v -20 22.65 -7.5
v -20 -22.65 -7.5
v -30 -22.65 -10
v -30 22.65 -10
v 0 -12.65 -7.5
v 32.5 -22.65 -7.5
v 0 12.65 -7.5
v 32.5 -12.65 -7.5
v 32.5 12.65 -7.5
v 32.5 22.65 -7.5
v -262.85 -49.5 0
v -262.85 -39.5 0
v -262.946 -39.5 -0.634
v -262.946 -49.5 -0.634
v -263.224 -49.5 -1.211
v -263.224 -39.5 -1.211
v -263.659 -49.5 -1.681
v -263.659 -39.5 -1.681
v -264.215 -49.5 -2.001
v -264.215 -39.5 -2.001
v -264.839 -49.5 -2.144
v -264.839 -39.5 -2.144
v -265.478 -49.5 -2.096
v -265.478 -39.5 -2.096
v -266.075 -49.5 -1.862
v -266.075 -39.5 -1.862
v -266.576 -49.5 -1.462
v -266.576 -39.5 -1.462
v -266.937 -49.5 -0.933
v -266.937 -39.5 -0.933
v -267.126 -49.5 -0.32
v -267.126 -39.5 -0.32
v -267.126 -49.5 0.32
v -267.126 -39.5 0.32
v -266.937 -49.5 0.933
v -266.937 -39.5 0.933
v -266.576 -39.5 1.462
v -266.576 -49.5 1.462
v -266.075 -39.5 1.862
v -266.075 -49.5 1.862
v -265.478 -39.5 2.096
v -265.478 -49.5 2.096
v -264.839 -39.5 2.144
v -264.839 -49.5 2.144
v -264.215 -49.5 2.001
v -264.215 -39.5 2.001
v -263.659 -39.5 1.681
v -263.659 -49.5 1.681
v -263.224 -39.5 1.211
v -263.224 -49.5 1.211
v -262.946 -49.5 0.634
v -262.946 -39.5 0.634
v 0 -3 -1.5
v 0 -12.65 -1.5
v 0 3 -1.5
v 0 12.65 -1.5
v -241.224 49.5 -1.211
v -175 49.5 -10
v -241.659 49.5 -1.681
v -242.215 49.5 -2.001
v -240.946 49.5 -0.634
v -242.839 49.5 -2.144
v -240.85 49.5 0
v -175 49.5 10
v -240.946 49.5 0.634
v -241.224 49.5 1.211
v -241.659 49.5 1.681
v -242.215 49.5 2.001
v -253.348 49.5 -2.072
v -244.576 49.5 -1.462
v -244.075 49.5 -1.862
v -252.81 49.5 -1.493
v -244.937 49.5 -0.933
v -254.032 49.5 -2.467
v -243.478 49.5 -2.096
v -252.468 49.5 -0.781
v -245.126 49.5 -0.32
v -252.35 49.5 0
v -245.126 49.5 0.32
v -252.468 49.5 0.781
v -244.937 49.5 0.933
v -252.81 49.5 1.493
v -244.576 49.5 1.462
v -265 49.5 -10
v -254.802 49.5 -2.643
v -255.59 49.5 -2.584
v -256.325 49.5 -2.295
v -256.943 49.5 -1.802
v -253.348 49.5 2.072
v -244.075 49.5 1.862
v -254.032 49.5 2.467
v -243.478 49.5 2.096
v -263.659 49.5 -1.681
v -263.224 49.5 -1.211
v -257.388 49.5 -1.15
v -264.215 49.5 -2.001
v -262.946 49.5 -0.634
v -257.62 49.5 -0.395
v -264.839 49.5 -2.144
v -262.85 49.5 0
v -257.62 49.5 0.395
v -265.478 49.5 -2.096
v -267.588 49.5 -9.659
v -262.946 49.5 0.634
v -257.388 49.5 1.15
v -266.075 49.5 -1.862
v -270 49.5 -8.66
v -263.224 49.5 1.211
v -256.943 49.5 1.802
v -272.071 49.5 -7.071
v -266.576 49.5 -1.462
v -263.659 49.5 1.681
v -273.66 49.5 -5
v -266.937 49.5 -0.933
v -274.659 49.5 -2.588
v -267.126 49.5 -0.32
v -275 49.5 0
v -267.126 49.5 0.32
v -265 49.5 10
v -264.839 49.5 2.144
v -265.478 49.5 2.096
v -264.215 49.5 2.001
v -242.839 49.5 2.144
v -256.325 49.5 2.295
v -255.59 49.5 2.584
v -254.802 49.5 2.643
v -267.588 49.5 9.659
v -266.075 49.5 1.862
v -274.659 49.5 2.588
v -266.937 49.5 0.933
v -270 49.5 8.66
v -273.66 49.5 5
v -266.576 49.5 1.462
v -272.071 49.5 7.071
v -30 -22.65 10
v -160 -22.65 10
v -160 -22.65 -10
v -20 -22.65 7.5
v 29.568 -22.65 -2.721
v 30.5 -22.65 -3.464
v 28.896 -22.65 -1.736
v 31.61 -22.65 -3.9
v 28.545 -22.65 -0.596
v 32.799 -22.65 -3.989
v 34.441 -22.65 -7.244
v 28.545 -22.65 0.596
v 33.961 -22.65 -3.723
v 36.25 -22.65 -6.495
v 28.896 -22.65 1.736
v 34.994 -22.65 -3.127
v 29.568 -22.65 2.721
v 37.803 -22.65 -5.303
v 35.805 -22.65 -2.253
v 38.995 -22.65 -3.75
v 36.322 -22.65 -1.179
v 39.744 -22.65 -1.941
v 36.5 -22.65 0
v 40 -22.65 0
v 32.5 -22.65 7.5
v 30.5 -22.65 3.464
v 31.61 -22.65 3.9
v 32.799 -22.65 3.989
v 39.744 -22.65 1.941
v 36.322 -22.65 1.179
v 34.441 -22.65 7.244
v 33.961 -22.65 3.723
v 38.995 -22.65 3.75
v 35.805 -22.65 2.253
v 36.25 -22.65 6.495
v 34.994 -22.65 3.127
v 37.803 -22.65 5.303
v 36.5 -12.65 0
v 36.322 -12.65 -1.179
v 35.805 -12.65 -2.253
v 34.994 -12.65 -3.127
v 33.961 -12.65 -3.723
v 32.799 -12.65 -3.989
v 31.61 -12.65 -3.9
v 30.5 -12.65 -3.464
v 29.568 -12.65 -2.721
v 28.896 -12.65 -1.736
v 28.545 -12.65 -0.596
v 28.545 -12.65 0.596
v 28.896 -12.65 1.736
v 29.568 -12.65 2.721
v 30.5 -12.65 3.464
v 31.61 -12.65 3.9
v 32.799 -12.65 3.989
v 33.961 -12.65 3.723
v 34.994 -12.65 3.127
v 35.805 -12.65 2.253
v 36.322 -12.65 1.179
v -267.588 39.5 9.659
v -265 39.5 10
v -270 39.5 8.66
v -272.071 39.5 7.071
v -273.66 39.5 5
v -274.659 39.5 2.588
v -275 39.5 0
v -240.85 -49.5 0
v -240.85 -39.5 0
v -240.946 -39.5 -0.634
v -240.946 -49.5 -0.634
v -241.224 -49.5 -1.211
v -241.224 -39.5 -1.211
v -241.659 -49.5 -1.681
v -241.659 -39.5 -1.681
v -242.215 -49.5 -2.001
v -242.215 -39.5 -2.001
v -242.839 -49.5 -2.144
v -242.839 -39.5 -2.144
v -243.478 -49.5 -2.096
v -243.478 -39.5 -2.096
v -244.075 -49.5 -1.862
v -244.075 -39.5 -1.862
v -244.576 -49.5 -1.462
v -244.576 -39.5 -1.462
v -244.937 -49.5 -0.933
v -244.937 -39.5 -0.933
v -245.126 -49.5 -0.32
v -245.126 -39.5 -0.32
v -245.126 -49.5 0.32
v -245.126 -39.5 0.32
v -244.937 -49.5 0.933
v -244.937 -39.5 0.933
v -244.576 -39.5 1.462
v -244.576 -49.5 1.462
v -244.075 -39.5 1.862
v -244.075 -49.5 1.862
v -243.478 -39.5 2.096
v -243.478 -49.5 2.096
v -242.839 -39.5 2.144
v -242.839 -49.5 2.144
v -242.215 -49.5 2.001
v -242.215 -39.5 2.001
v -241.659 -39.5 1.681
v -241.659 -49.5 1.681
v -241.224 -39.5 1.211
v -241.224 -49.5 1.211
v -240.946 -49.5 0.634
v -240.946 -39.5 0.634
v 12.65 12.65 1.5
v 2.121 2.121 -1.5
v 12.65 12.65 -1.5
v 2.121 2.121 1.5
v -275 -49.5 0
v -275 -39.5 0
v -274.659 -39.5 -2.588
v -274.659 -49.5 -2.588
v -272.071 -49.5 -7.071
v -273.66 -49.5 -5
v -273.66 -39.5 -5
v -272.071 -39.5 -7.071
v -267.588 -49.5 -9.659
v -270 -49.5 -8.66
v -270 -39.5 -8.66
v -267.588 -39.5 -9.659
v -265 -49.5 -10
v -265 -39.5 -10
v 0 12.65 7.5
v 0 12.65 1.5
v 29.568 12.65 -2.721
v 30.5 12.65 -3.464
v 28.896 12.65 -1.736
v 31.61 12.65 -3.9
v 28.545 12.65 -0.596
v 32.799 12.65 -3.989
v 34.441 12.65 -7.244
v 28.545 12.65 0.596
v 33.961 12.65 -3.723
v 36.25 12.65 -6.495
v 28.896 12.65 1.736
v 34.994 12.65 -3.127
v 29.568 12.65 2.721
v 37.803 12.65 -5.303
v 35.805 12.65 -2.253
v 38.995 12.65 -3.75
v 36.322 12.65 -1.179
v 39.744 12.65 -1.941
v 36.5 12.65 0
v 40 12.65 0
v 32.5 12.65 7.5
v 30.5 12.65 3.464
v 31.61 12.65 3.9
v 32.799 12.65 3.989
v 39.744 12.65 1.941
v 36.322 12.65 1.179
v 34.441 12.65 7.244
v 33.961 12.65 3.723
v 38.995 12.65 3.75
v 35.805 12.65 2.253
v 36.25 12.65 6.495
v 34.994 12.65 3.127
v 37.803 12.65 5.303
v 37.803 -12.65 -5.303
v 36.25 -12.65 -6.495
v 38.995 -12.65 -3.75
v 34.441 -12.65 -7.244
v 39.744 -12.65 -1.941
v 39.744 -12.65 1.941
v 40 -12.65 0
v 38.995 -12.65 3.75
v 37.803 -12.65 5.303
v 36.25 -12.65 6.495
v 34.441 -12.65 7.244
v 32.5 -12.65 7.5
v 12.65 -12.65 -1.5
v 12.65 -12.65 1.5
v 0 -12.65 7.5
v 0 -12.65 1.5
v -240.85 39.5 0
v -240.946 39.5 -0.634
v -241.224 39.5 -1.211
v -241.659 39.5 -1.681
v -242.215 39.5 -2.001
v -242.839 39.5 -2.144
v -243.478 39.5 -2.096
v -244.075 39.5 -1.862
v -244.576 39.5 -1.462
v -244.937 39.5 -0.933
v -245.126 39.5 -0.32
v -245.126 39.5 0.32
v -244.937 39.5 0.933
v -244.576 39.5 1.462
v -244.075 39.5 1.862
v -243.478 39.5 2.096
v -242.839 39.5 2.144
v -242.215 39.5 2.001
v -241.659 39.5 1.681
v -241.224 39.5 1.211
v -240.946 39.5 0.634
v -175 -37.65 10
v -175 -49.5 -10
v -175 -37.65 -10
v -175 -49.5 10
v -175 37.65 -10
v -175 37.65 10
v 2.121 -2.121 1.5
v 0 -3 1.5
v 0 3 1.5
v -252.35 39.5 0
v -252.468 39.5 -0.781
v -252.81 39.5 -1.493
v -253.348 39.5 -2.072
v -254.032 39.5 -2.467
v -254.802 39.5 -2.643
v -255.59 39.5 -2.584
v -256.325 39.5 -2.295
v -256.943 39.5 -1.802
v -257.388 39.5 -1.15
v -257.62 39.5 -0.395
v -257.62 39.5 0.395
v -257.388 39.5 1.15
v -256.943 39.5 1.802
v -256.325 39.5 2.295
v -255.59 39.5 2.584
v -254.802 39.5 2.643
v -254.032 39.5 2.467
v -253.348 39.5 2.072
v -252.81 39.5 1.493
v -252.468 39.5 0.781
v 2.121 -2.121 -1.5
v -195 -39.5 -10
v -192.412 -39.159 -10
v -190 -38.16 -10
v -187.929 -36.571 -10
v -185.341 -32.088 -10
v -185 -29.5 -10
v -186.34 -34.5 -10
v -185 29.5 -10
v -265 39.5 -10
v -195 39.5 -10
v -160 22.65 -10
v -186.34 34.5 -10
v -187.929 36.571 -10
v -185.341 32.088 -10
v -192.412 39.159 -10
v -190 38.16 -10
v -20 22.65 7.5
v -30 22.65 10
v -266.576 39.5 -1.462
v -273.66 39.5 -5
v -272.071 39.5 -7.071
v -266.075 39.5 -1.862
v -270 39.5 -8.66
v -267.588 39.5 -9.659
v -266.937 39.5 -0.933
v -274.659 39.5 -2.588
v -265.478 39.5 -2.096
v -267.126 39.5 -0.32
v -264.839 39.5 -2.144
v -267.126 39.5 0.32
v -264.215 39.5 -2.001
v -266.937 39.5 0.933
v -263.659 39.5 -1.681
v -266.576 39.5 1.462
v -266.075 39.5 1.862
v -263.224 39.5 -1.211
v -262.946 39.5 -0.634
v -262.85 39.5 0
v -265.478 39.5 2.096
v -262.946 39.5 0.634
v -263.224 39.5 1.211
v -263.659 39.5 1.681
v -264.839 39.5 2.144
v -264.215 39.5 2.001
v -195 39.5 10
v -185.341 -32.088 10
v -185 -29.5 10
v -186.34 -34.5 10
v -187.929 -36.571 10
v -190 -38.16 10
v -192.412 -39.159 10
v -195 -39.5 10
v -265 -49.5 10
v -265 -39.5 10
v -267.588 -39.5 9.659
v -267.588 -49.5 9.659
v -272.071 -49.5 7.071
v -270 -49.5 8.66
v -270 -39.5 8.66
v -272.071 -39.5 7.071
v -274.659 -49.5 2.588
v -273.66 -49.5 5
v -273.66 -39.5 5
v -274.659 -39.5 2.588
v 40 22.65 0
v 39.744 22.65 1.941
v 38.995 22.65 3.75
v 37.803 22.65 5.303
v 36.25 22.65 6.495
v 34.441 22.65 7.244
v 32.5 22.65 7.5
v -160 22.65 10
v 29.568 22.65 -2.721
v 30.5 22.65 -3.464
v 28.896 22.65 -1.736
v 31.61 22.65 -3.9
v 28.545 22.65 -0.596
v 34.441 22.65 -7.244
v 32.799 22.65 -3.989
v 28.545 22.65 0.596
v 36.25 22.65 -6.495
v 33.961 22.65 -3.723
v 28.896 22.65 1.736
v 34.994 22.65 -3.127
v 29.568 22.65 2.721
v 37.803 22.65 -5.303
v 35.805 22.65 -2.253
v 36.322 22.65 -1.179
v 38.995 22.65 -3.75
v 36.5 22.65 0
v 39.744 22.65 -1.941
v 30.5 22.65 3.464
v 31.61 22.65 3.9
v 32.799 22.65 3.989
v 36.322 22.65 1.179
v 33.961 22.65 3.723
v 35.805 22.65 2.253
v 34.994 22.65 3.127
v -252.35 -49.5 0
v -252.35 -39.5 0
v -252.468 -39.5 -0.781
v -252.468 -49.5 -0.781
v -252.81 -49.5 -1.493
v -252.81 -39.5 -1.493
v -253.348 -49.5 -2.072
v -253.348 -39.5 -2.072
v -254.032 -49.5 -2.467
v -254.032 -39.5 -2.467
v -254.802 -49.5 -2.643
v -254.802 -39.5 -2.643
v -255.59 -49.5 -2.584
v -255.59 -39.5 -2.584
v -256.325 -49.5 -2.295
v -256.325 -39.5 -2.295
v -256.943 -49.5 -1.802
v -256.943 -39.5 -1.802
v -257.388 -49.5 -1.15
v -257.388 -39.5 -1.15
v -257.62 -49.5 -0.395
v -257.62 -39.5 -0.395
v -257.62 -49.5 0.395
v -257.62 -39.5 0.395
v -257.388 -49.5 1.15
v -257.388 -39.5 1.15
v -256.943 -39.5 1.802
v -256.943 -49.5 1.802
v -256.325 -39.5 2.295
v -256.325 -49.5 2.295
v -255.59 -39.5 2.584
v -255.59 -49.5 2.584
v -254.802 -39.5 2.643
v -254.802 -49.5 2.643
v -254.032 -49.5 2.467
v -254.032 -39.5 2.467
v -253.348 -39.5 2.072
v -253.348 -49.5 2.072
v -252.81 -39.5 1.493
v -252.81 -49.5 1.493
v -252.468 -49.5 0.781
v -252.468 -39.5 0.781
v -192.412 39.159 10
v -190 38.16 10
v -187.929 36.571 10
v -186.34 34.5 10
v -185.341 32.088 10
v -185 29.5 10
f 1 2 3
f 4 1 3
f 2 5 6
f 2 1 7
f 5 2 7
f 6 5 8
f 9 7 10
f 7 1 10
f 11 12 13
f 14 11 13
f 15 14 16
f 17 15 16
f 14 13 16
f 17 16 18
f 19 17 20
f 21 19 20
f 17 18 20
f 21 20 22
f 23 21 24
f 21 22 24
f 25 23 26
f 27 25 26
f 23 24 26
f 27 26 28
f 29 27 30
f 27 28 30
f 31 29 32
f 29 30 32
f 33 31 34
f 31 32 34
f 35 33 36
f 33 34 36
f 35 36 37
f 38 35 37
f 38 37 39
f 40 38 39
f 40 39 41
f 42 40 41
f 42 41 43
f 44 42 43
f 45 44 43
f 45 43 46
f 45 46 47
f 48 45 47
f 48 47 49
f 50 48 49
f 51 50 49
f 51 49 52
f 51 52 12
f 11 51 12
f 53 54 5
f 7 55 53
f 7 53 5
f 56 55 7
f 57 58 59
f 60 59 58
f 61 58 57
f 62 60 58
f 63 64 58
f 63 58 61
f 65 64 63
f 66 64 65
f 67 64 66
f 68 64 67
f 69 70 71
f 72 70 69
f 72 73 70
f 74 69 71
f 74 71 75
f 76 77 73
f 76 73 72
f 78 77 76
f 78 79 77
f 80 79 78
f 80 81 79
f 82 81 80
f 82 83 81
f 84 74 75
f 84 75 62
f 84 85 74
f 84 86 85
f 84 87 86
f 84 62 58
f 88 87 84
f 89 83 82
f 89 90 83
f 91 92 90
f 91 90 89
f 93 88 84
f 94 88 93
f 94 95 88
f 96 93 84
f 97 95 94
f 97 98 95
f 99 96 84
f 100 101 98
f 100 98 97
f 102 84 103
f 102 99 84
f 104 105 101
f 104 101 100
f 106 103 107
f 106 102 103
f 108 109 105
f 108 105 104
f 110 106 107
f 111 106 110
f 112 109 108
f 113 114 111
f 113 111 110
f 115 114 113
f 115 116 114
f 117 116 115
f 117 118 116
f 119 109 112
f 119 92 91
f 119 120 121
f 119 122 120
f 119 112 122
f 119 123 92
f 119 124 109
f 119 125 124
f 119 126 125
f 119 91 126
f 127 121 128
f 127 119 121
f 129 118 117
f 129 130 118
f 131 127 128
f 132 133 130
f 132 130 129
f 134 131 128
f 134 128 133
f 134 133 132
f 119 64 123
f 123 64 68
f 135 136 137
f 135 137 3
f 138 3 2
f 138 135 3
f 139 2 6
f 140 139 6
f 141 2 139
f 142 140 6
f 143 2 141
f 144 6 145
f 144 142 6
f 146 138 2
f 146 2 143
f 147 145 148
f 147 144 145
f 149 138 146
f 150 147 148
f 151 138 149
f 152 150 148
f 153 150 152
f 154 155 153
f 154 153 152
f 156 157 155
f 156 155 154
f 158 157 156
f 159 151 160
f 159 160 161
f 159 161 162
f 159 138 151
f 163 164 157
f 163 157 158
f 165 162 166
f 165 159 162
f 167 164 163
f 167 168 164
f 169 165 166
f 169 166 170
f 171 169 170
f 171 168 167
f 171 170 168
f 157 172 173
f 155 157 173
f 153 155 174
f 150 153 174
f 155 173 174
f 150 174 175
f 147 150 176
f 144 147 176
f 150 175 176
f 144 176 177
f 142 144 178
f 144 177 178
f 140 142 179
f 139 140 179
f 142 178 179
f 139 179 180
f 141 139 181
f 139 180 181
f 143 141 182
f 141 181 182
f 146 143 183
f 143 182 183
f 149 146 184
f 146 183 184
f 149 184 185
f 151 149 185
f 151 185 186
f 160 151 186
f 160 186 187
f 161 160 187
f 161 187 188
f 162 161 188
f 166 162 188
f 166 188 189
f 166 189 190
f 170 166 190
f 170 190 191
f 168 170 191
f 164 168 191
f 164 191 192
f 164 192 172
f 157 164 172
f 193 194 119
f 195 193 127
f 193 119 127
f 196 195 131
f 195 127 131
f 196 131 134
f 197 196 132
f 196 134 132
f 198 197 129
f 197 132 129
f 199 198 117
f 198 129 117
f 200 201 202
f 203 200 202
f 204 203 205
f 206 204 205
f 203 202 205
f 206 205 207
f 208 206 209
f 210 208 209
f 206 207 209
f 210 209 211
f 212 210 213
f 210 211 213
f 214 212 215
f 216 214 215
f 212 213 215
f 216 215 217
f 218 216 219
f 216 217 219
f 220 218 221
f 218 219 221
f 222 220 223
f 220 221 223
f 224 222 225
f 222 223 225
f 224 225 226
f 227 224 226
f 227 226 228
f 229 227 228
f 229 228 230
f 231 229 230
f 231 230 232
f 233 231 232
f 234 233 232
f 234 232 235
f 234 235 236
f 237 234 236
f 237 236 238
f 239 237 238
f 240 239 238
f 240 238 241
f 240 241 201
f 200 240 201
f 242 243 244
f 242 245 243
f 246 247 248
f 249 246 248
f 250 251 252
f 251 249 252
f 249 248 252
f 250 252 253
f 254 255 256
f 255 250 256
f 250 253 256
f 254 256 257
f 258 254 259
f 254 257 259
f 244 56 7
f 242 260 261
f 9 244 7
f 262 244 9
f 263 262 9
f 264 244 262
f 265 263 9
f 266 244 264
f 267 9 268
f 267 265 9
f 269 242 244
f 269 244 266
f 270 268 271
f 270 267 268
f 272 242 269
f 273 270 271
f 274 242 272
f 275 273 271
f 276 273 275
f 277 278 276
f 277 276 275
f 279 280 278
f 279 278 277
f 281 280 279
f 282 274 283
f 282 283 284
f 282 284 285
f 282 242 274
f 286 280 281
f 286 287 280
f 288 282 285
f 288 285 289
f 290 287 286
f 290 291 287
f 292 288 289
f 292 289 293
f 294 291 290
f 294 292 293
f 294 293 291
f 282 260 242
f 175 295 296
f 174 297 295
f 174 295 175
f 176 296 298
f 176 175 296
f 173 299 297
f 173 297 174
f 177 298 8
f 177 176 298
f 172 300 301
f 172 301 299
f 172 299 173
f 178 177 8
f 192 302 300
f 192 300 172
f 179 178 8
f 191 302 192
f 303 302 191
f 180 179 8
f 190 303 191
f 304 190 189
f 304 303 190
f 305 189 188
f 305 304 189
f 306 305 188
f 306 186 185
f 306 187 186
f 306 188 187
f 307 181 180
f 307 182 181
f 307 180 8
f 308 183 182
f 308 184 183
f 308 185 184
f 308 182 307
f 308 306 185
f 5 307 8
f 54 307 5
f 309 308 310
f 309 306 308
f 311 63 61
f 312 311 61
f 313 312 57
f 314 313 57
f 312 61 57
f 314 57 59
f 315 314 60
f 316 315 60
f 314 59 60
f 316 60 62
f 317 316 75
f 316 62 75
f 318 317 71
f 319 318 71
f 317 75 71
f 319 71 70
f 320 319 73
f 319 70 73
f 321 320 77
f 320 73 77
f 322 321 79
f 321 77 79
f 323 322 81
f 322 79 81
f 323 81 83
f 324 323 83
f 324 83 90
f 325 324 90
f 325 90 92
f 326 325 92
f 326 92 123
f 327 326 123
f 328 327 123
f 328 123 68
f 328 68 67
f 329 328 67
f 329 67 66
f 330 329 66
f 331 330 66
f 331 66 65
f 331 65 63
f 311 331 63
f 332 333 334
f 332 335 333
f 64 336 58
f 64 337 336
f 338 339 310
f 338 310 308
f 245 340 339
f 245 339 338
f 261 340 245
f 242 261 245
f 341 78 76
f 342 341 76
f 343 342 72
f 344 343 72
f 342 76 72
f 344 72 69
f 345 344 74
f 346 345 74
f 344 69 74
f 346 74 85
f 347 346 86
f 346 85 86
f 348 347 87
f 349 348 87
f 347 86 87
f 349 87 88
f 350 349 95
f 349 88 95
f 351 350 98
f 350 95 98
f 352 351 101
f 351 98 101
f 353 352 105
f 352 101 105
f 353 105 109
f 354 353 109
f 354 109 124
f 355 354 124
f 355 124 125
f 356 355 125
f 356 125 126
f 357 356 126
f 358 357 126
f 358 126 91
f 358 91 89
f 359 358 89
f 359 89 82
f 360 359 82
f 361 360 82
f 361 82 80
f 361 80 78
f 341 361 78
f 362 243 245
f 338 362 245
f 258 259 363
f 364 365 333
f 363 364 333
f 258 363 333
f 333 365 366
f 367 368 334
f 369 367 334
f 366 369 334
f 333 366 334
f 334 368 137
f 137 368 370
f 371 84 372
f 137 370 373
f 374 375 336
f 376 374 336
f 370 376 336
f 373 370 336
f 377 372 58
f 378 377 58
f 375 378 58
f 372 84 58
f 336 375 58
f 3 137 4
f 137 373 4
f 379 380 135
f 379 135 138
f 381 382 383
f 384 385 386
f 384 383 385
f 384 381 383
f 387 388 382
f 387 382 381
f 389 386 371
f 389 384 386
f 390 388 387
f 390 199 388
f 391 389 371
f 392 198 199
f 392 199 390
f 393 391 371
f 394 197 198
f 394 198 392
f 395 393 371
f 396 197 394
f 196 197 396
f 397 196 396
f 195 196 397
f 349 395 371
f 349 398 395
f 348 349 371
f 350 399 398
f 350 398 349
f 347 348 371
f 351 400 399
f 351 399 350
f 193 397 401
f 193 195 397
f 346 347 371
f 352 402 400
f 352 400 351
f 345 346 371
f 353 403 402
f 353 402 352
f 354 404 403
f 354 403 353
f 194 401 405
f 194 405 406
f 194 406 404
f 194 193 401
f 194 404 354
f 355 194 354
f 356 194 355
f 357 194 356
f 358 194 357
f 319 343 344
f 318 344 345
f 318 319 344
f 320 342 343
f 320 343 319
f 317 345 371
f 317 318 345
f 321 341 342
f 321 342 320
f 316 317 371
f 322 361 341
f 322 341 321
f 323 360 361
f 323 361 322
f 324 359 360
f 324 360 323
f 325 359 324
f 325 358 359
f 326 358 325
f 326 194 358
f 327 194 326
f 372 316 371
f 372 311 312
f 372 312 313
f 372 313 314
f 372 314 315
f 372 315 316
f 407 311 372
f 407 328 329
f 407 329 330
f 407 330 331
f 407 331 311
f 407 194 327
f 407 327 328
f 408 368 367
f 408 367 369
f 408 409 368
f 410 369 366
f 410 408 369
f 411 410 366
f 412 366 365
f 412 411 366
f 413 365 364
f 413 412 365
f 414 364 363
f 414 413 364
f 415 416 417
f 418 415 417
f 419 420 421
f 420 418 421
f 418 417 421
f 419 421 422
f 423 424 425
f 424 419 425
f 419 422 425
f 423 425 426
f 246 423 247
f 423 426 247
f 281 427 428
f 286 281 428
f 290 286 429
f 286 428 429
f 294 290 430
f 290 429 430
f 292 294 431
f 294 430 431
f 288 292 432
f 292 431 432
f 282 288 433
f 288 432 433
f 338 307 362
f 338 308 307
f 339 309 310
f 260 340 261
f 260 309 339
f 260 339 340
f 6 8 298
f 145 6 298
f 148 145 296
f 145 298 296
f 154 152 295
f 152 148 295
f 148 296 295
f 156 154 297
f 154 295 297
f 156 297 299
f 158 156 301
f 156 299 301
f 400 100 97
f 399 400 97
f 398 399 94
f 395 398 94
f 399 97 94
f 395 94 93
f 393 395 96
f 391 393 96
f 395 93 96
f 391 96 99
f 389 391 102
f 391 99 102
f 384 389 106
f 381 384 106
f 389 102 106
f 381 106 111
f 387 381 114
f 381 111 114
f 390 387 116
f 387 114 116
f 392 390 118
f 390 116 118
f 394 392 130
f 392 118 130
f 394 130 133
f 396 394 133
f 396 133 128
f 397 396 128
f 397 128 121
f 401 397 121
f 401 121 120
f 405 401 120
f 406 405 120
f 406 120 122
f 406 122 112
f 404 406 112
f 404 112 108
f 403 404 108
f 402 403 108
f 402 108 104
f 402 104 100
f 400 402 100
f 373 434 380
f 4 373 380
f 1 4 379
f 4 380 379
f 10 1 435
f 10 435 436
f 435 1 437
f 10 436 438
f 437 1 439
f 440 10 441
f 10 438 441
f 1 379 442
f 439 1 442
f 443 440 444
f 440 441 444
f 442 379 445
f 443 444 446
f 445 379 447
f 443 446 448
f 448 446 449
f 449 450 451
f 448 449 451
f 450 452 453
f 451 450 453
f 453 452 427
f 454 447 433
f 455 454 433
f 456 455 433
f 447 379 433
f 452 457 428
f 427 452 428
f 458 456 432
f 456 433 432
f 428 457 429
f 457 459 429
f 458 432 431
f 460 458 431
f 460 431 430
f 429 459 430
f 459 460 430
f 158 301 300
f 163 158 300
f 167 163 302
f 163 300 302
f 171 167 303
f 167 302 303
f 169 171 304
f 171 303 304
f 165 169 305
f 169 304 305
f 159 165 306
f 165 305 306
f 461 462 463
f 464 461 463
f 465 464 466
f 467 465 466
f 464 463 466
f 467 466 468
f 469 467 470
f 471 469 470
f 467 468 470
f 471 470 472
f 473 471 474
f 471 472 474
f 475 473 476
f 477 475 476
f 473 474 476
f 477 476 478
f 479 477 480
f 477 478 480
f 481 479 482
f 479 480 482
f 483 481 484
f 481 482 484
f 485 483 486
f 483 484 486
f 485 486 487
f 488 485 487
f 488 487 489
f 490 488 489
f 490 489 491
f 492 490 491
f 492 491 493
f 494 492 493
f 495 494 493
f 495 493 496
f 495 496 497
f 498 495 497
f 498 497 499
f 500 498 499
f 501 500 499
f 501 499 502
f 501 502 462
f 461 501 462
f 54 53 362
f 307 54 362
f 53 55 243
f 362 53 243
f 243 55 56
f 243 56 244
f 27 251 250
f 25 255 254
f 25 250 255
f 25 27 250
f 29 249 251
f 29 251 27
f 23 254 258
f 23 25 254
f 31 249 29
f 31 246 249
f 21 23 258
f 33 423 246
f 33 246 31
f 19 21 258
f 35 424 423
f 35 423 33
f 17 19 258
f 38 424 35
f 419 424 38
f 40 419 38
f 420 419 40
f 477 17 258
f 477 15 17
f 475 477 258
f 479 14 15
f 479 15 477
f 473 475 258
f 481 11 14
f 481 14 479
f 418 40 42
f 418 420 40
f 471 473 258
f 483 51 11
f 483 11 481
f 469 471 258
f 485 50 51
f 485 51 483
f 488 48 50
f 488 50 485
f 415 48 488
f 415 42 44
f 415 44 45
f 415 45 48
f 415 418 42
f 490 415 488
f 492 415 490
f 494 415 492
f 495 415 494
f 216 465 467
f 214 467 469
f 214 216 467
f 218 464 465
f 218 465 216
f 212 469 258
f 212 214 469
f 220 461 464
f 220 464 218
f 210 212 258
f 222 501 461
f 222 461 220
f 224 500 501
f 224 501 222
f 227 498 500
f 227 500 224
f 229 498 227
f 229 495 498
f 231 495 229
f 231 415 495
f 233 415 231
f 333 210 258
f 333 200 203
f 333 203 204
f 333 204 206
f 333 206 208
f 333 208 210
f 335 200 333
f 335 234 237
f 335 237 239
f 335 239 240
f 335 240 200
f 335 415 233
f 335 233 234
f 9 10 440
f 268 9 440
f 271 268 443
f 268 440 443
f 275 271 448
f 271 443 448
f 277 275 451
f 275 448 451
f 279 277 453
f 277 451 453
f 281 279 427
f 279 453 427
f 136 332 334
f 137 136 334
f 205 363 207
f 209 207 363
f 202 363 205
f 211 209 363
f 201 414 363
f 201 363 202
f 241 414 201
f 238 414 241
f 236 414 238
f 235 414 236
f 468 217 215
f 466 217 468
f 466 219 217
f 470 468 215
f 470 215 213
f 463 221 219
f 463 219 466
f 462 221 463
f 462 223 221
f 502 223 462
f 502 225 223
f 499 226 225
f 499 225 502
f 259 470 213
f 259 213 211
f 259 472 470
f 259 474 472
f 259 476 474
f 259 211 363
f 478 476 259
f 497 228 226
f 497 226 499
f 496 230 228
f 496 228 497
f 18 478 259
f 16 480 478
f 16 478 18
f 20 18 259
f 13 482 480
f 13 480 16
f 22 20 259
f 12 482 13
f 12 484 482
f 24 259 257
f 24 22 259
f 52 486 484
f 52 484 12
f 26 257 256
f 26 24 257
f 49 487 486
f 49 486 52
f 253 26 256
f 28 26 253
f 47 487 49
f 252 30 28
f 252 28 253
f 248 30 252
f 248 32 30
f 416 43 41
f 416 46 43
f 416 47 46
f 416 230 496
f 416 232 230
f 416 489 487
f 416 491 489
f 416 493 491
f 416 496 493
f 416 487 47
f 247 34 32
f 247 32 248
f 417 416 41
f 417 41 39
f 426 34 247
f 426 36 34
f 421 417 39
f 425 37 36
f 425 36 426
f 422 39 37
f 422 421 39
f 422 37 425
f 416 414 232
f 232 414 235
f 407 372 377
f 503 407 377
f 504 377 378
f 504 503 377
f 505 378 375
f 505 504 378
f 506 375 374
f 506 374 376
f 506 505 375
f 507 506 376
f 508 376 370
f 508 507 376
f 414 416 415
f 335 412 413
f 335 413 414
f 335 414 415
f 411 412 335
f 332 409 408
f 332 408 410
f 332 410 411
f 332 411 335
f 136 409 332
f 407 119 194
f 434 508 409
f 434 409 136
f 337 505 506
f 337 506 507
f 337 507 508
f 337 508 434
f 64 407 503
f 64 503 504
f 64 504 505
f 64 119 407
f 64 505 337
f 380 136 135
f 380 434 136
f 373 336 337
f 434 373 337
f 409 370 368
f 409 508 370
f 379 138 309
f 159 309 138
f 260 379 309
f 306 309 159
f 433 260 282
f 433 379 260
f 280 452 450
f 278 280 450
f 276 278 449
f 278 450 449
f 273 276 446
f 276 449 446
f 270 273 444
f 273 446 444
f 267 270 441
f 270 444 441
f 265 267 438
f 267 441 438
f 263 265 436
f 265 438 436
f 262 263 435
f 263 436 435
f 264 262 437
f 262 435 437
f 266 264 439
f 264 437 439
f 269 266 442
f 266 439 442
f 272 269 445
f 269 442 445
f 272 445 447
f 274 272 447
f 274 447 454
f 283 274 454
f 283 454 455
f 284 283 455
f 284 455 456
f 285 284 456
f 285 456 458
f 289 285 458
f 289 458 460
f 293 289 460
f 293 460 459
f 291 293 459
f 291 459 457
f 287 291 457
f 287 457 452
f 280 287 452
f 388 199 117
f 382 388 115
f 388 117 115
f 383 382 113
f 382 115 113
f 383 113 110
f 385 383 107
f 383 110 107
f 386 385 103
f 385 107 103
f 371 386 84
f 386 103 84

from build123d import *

# Parameters (mm, degrees)
SKETCH_2_W          = 165
SKETCH_2_H          = 45.3
EXTRUDE_1_DEPTH     = 10
EXTRUDE_2_DEPTH     = 7.5
CHAMFER_1_SIZE      = 20
CHAMFER_1_SIZE_2    = 5
CHAMFER_2_SIZE      = 5
CHAMFER_2_SIZE_2    = 20
EXTRUDE_3_DEPTH     = 1.5
CHAMFER_3_SIZE      = 3
CUT_EXTRUDE_1_DEPTH = 293.448286027
CUT_EXTRUDE_2_DEPTH = 285.483079462
CHAMFER_4_SIZE      = 15
FILLET_1_R          = 10


with BuildPart() as part:
    # 草图2 → 凸台-拉伸1 (new, symmetric)
    with BuildSketch(Plane.XY):
        with Locations((-92.5, 0)):
            Rectangle(SKETCH_2_W, SKETCH_2_H)
        Polygon((-275, 49.5), (-275, 39.5), (-185, 39.5), (-185, -39.5), (-275, -39.5), (-275, -49.5), (-175, -49.5), (-175, 49.5), align=None)
    extrude(amount=EXTRUDE_1_DEPTH, both=True)

    # 草图2<3> → 凸台-拉伸2 (add, symmetric)
    with BuildSketch(Plane.XY):
        Polygon((40, -22.65), (40, -12.65), (0, -12.65), (0, 12.65), (40, 12.65), (40, 22.65), (-10, 22.65), (-10, -22.65), align=None)
    extrude(amount=EXTRUDE_2_DEPTH, both=True)

    # 倒角1
    # the kernel refuses this chamfer: 20, 5 mm, written as the material it takes off along each edge
    with BuildSketch(Plane(origin=(-10, -74.592549995, 10), x_dir=(-0.9999563942249224, 0, 0.00933861064031752), z_dir=(0, 1, 0))) as chamfer_1_piece_1_section:
        Polygon((CHAMFER_1_SIZE * 0.999956394225, -CHAMFER_1_SIZE * 0.00933861064032), (-CHAMFER_1_SIZE_2 * 0.00933861064032, -CHAMFER_1_SIZE_2 * 0.999956394225), (0, 0), align=None)
    chamfer_1_piece_1 = extrude(amount=149.185099991, mode=Mode.PRIVATE)
    chamfer_1_piece_1 = split(chamfer_1_piece_1, bisect_by=Plane(origin=(-18.245866107, 0, 7.5), z_dir=(0, 0, 1)), keep=Keep.TOP, mode=Mode.PRIVATE)
    add(chamfer_1_piece_1, mode=Mode.SUBTRACT)

    # 倒角2
    # the kernel refuses this chamfer: 20, 5 mm, written as the material it takes off along each edge
    with BuildSketch(Plane(origin=(-10, -74.592549995, -10), x_dir=(0.14778356633657133, 0, 0.9890197255468893), z_dir=(0, 1, 0))) as chamfer_2_piece_1_section:
        Polygon((CHAMFER_2_SIZE * 0.989019725547, -CHAMFER_2_SIZE * 0.147783566337), (-CHAMFER_2_SIZE_2 * 0.147783566337, -CHAMFER_2_SIZE_2 * 0.989019725547), (0, 0), align=None)
    chamfer_2_piece_1 = extrude(amount=149.185099991, mode=Mode.PRIVATE)
    chamfer_2_piece_1 = split(chamfer_2_piece_1, bisect_by=Plane(origin=(-18.245866107, 0, -7.5), z_dir=(0, 0, -1)), keep=Keep.TOP, mode=Mode.PRIVATE)
    add(chamfer_2_piece_1, mode=Mode.SUBTRACT)

    # 草图2<5> → 凸台-拉伸3 (add, symmetric)
    with BuildSketch(Plane.XY):
        Polygon((12.65, 12.65), (0, 12.65), (0, 0), align=None)
        Polygon((12.65, -12.65), (0, 0), (0, -12.65), align=None)
    extrude(amount=EXTRUDE_3_DEPTH, both=True)

    # 倒角3
    chamfer_3_edges = [part.edges().sort_by_distance(p)[0] for p in [
        (0, 0, 0),
    ]]
    chamfer(chamfer_3_edges, length=CHAMFER_3_SIZE)

    # 草图3 → 切除-拉伸1 (cut, through all)
    with BuildSketch(Plane(origin=(0, 49.5, 0), x_dir=(1, 0, 0), z_dir=(0, 1, 0))):
        with BuildLine():
            ThreePointArc((-275, 0), (-272.071067812, 7.071067812), (-265, 10))
            Line((-265, 10), (-275, 10))
            Line((-275, 10), (-275, 0))
        make_face()
        with BuildLine():
            Line((-275, -10), (-265, -10))
            ThreePointArc((-265, -10), (-272.071067812, -7.071067812), (-275, 0))
            Line((-275, 0), (-275, -10))
        make_face()
        with BuildLine():
            ThreePointArc((-267.15, 0), (-265, -2.15), (-262.85, 0))
            Line((-262.85, 0), (-267.15, 0))
        make_face()
        with BuildLine():
            Line((-267.15, 0), (-262.85, 0))
            ThreePointArc((-262.85, 0), (-265, 2.15), (-267.15, 0))
        make_face()
        with BuildLine():
            ThreePointArc((-257.65, 0), (-255, -2.65), (-252.35, 0))
            Line((-252.35, 0), (-257.65, 0))
        make_face()
        with BuildLine():
            Line((-257.65, 0), (-252.35, 0))
            ThreePointArc((-252.35, 0), (-255, 2.65), (-257.65, 0))
        make_face()
        with BuildLine():
            ThreePointArc((-245.15, 0), (-243, -2.15), (-240.85, 0))
            Line((-240.85, 0), (-245.15, 0))
        make_face()
        with BuildLine():
            Line((-245.15, 0), (-240.85, 0))
            ThreePointArc((-240.85, 0), (-243, 2.15), (-245.15, 0))
        make_face()
    extrude(amount=-CUT_EXTRUDE_1_DEPTH, mode=Mode.SUBTRACT)

    # 草图4 → 切除-拉伸2 (cut, through all)
    with BuildSketch(Plane(origin=(0, 22.65, 0), x_dir=(1, 0, 0), z_dir=(0, 1, 0))):
        with BuildLine():
            ThreePointArc((28.5, 0), (32.5, -4), (36.5, 0))
            Line((36.5, 0), (28.5, 0))
        make_face()
        with BuildLine():
            Line((28.5, 0), (36.5, 0))
            ThreePointArc((36.5, 0), (32.5, 4), (28.5, 0))
        make_face()
        with BuildLine():
            ThreePointArc((32.5, 7.5), (37.803300859, 5.303300859), (40, 0))
            Line((40, 0), (40, 7.5))
            Line((40, 7.5), (32.5, 7.5))
        make_face()
        with BuildLine():
            Line((40, -7.5), (40, 0))
            ThreePointArc((40, 0), (37.80330088, -5.303300838), (32.500000061, -7.5))
            Line((32.500000061, -7.5), (40, -7.5))
        make_face()
    extrude(amount=-CUT_EXTRUDE_2_DEPTH, mode=Mode.SUBTRACT)

    # 倒角4
    chamfer_4_edges = [part.edges().sort_by_distance(p)[0] for p in [
        (-175, -22.65, 0),
        (-175, 22.65, 0),
    ]]
    chamfer(chamfer_4_edges, length=CHAMFER_4_SIZE)

    # 圆角1
    fillet_1_edges = [part.edges().sort_by_distance(p)[0] for p in [
        (-185, -39.5, 0),
        (-185, 39.5, 0),
    ]]
    fillet(fillet_1_edges, radius=FILLET_1_R)


solid = part.part
